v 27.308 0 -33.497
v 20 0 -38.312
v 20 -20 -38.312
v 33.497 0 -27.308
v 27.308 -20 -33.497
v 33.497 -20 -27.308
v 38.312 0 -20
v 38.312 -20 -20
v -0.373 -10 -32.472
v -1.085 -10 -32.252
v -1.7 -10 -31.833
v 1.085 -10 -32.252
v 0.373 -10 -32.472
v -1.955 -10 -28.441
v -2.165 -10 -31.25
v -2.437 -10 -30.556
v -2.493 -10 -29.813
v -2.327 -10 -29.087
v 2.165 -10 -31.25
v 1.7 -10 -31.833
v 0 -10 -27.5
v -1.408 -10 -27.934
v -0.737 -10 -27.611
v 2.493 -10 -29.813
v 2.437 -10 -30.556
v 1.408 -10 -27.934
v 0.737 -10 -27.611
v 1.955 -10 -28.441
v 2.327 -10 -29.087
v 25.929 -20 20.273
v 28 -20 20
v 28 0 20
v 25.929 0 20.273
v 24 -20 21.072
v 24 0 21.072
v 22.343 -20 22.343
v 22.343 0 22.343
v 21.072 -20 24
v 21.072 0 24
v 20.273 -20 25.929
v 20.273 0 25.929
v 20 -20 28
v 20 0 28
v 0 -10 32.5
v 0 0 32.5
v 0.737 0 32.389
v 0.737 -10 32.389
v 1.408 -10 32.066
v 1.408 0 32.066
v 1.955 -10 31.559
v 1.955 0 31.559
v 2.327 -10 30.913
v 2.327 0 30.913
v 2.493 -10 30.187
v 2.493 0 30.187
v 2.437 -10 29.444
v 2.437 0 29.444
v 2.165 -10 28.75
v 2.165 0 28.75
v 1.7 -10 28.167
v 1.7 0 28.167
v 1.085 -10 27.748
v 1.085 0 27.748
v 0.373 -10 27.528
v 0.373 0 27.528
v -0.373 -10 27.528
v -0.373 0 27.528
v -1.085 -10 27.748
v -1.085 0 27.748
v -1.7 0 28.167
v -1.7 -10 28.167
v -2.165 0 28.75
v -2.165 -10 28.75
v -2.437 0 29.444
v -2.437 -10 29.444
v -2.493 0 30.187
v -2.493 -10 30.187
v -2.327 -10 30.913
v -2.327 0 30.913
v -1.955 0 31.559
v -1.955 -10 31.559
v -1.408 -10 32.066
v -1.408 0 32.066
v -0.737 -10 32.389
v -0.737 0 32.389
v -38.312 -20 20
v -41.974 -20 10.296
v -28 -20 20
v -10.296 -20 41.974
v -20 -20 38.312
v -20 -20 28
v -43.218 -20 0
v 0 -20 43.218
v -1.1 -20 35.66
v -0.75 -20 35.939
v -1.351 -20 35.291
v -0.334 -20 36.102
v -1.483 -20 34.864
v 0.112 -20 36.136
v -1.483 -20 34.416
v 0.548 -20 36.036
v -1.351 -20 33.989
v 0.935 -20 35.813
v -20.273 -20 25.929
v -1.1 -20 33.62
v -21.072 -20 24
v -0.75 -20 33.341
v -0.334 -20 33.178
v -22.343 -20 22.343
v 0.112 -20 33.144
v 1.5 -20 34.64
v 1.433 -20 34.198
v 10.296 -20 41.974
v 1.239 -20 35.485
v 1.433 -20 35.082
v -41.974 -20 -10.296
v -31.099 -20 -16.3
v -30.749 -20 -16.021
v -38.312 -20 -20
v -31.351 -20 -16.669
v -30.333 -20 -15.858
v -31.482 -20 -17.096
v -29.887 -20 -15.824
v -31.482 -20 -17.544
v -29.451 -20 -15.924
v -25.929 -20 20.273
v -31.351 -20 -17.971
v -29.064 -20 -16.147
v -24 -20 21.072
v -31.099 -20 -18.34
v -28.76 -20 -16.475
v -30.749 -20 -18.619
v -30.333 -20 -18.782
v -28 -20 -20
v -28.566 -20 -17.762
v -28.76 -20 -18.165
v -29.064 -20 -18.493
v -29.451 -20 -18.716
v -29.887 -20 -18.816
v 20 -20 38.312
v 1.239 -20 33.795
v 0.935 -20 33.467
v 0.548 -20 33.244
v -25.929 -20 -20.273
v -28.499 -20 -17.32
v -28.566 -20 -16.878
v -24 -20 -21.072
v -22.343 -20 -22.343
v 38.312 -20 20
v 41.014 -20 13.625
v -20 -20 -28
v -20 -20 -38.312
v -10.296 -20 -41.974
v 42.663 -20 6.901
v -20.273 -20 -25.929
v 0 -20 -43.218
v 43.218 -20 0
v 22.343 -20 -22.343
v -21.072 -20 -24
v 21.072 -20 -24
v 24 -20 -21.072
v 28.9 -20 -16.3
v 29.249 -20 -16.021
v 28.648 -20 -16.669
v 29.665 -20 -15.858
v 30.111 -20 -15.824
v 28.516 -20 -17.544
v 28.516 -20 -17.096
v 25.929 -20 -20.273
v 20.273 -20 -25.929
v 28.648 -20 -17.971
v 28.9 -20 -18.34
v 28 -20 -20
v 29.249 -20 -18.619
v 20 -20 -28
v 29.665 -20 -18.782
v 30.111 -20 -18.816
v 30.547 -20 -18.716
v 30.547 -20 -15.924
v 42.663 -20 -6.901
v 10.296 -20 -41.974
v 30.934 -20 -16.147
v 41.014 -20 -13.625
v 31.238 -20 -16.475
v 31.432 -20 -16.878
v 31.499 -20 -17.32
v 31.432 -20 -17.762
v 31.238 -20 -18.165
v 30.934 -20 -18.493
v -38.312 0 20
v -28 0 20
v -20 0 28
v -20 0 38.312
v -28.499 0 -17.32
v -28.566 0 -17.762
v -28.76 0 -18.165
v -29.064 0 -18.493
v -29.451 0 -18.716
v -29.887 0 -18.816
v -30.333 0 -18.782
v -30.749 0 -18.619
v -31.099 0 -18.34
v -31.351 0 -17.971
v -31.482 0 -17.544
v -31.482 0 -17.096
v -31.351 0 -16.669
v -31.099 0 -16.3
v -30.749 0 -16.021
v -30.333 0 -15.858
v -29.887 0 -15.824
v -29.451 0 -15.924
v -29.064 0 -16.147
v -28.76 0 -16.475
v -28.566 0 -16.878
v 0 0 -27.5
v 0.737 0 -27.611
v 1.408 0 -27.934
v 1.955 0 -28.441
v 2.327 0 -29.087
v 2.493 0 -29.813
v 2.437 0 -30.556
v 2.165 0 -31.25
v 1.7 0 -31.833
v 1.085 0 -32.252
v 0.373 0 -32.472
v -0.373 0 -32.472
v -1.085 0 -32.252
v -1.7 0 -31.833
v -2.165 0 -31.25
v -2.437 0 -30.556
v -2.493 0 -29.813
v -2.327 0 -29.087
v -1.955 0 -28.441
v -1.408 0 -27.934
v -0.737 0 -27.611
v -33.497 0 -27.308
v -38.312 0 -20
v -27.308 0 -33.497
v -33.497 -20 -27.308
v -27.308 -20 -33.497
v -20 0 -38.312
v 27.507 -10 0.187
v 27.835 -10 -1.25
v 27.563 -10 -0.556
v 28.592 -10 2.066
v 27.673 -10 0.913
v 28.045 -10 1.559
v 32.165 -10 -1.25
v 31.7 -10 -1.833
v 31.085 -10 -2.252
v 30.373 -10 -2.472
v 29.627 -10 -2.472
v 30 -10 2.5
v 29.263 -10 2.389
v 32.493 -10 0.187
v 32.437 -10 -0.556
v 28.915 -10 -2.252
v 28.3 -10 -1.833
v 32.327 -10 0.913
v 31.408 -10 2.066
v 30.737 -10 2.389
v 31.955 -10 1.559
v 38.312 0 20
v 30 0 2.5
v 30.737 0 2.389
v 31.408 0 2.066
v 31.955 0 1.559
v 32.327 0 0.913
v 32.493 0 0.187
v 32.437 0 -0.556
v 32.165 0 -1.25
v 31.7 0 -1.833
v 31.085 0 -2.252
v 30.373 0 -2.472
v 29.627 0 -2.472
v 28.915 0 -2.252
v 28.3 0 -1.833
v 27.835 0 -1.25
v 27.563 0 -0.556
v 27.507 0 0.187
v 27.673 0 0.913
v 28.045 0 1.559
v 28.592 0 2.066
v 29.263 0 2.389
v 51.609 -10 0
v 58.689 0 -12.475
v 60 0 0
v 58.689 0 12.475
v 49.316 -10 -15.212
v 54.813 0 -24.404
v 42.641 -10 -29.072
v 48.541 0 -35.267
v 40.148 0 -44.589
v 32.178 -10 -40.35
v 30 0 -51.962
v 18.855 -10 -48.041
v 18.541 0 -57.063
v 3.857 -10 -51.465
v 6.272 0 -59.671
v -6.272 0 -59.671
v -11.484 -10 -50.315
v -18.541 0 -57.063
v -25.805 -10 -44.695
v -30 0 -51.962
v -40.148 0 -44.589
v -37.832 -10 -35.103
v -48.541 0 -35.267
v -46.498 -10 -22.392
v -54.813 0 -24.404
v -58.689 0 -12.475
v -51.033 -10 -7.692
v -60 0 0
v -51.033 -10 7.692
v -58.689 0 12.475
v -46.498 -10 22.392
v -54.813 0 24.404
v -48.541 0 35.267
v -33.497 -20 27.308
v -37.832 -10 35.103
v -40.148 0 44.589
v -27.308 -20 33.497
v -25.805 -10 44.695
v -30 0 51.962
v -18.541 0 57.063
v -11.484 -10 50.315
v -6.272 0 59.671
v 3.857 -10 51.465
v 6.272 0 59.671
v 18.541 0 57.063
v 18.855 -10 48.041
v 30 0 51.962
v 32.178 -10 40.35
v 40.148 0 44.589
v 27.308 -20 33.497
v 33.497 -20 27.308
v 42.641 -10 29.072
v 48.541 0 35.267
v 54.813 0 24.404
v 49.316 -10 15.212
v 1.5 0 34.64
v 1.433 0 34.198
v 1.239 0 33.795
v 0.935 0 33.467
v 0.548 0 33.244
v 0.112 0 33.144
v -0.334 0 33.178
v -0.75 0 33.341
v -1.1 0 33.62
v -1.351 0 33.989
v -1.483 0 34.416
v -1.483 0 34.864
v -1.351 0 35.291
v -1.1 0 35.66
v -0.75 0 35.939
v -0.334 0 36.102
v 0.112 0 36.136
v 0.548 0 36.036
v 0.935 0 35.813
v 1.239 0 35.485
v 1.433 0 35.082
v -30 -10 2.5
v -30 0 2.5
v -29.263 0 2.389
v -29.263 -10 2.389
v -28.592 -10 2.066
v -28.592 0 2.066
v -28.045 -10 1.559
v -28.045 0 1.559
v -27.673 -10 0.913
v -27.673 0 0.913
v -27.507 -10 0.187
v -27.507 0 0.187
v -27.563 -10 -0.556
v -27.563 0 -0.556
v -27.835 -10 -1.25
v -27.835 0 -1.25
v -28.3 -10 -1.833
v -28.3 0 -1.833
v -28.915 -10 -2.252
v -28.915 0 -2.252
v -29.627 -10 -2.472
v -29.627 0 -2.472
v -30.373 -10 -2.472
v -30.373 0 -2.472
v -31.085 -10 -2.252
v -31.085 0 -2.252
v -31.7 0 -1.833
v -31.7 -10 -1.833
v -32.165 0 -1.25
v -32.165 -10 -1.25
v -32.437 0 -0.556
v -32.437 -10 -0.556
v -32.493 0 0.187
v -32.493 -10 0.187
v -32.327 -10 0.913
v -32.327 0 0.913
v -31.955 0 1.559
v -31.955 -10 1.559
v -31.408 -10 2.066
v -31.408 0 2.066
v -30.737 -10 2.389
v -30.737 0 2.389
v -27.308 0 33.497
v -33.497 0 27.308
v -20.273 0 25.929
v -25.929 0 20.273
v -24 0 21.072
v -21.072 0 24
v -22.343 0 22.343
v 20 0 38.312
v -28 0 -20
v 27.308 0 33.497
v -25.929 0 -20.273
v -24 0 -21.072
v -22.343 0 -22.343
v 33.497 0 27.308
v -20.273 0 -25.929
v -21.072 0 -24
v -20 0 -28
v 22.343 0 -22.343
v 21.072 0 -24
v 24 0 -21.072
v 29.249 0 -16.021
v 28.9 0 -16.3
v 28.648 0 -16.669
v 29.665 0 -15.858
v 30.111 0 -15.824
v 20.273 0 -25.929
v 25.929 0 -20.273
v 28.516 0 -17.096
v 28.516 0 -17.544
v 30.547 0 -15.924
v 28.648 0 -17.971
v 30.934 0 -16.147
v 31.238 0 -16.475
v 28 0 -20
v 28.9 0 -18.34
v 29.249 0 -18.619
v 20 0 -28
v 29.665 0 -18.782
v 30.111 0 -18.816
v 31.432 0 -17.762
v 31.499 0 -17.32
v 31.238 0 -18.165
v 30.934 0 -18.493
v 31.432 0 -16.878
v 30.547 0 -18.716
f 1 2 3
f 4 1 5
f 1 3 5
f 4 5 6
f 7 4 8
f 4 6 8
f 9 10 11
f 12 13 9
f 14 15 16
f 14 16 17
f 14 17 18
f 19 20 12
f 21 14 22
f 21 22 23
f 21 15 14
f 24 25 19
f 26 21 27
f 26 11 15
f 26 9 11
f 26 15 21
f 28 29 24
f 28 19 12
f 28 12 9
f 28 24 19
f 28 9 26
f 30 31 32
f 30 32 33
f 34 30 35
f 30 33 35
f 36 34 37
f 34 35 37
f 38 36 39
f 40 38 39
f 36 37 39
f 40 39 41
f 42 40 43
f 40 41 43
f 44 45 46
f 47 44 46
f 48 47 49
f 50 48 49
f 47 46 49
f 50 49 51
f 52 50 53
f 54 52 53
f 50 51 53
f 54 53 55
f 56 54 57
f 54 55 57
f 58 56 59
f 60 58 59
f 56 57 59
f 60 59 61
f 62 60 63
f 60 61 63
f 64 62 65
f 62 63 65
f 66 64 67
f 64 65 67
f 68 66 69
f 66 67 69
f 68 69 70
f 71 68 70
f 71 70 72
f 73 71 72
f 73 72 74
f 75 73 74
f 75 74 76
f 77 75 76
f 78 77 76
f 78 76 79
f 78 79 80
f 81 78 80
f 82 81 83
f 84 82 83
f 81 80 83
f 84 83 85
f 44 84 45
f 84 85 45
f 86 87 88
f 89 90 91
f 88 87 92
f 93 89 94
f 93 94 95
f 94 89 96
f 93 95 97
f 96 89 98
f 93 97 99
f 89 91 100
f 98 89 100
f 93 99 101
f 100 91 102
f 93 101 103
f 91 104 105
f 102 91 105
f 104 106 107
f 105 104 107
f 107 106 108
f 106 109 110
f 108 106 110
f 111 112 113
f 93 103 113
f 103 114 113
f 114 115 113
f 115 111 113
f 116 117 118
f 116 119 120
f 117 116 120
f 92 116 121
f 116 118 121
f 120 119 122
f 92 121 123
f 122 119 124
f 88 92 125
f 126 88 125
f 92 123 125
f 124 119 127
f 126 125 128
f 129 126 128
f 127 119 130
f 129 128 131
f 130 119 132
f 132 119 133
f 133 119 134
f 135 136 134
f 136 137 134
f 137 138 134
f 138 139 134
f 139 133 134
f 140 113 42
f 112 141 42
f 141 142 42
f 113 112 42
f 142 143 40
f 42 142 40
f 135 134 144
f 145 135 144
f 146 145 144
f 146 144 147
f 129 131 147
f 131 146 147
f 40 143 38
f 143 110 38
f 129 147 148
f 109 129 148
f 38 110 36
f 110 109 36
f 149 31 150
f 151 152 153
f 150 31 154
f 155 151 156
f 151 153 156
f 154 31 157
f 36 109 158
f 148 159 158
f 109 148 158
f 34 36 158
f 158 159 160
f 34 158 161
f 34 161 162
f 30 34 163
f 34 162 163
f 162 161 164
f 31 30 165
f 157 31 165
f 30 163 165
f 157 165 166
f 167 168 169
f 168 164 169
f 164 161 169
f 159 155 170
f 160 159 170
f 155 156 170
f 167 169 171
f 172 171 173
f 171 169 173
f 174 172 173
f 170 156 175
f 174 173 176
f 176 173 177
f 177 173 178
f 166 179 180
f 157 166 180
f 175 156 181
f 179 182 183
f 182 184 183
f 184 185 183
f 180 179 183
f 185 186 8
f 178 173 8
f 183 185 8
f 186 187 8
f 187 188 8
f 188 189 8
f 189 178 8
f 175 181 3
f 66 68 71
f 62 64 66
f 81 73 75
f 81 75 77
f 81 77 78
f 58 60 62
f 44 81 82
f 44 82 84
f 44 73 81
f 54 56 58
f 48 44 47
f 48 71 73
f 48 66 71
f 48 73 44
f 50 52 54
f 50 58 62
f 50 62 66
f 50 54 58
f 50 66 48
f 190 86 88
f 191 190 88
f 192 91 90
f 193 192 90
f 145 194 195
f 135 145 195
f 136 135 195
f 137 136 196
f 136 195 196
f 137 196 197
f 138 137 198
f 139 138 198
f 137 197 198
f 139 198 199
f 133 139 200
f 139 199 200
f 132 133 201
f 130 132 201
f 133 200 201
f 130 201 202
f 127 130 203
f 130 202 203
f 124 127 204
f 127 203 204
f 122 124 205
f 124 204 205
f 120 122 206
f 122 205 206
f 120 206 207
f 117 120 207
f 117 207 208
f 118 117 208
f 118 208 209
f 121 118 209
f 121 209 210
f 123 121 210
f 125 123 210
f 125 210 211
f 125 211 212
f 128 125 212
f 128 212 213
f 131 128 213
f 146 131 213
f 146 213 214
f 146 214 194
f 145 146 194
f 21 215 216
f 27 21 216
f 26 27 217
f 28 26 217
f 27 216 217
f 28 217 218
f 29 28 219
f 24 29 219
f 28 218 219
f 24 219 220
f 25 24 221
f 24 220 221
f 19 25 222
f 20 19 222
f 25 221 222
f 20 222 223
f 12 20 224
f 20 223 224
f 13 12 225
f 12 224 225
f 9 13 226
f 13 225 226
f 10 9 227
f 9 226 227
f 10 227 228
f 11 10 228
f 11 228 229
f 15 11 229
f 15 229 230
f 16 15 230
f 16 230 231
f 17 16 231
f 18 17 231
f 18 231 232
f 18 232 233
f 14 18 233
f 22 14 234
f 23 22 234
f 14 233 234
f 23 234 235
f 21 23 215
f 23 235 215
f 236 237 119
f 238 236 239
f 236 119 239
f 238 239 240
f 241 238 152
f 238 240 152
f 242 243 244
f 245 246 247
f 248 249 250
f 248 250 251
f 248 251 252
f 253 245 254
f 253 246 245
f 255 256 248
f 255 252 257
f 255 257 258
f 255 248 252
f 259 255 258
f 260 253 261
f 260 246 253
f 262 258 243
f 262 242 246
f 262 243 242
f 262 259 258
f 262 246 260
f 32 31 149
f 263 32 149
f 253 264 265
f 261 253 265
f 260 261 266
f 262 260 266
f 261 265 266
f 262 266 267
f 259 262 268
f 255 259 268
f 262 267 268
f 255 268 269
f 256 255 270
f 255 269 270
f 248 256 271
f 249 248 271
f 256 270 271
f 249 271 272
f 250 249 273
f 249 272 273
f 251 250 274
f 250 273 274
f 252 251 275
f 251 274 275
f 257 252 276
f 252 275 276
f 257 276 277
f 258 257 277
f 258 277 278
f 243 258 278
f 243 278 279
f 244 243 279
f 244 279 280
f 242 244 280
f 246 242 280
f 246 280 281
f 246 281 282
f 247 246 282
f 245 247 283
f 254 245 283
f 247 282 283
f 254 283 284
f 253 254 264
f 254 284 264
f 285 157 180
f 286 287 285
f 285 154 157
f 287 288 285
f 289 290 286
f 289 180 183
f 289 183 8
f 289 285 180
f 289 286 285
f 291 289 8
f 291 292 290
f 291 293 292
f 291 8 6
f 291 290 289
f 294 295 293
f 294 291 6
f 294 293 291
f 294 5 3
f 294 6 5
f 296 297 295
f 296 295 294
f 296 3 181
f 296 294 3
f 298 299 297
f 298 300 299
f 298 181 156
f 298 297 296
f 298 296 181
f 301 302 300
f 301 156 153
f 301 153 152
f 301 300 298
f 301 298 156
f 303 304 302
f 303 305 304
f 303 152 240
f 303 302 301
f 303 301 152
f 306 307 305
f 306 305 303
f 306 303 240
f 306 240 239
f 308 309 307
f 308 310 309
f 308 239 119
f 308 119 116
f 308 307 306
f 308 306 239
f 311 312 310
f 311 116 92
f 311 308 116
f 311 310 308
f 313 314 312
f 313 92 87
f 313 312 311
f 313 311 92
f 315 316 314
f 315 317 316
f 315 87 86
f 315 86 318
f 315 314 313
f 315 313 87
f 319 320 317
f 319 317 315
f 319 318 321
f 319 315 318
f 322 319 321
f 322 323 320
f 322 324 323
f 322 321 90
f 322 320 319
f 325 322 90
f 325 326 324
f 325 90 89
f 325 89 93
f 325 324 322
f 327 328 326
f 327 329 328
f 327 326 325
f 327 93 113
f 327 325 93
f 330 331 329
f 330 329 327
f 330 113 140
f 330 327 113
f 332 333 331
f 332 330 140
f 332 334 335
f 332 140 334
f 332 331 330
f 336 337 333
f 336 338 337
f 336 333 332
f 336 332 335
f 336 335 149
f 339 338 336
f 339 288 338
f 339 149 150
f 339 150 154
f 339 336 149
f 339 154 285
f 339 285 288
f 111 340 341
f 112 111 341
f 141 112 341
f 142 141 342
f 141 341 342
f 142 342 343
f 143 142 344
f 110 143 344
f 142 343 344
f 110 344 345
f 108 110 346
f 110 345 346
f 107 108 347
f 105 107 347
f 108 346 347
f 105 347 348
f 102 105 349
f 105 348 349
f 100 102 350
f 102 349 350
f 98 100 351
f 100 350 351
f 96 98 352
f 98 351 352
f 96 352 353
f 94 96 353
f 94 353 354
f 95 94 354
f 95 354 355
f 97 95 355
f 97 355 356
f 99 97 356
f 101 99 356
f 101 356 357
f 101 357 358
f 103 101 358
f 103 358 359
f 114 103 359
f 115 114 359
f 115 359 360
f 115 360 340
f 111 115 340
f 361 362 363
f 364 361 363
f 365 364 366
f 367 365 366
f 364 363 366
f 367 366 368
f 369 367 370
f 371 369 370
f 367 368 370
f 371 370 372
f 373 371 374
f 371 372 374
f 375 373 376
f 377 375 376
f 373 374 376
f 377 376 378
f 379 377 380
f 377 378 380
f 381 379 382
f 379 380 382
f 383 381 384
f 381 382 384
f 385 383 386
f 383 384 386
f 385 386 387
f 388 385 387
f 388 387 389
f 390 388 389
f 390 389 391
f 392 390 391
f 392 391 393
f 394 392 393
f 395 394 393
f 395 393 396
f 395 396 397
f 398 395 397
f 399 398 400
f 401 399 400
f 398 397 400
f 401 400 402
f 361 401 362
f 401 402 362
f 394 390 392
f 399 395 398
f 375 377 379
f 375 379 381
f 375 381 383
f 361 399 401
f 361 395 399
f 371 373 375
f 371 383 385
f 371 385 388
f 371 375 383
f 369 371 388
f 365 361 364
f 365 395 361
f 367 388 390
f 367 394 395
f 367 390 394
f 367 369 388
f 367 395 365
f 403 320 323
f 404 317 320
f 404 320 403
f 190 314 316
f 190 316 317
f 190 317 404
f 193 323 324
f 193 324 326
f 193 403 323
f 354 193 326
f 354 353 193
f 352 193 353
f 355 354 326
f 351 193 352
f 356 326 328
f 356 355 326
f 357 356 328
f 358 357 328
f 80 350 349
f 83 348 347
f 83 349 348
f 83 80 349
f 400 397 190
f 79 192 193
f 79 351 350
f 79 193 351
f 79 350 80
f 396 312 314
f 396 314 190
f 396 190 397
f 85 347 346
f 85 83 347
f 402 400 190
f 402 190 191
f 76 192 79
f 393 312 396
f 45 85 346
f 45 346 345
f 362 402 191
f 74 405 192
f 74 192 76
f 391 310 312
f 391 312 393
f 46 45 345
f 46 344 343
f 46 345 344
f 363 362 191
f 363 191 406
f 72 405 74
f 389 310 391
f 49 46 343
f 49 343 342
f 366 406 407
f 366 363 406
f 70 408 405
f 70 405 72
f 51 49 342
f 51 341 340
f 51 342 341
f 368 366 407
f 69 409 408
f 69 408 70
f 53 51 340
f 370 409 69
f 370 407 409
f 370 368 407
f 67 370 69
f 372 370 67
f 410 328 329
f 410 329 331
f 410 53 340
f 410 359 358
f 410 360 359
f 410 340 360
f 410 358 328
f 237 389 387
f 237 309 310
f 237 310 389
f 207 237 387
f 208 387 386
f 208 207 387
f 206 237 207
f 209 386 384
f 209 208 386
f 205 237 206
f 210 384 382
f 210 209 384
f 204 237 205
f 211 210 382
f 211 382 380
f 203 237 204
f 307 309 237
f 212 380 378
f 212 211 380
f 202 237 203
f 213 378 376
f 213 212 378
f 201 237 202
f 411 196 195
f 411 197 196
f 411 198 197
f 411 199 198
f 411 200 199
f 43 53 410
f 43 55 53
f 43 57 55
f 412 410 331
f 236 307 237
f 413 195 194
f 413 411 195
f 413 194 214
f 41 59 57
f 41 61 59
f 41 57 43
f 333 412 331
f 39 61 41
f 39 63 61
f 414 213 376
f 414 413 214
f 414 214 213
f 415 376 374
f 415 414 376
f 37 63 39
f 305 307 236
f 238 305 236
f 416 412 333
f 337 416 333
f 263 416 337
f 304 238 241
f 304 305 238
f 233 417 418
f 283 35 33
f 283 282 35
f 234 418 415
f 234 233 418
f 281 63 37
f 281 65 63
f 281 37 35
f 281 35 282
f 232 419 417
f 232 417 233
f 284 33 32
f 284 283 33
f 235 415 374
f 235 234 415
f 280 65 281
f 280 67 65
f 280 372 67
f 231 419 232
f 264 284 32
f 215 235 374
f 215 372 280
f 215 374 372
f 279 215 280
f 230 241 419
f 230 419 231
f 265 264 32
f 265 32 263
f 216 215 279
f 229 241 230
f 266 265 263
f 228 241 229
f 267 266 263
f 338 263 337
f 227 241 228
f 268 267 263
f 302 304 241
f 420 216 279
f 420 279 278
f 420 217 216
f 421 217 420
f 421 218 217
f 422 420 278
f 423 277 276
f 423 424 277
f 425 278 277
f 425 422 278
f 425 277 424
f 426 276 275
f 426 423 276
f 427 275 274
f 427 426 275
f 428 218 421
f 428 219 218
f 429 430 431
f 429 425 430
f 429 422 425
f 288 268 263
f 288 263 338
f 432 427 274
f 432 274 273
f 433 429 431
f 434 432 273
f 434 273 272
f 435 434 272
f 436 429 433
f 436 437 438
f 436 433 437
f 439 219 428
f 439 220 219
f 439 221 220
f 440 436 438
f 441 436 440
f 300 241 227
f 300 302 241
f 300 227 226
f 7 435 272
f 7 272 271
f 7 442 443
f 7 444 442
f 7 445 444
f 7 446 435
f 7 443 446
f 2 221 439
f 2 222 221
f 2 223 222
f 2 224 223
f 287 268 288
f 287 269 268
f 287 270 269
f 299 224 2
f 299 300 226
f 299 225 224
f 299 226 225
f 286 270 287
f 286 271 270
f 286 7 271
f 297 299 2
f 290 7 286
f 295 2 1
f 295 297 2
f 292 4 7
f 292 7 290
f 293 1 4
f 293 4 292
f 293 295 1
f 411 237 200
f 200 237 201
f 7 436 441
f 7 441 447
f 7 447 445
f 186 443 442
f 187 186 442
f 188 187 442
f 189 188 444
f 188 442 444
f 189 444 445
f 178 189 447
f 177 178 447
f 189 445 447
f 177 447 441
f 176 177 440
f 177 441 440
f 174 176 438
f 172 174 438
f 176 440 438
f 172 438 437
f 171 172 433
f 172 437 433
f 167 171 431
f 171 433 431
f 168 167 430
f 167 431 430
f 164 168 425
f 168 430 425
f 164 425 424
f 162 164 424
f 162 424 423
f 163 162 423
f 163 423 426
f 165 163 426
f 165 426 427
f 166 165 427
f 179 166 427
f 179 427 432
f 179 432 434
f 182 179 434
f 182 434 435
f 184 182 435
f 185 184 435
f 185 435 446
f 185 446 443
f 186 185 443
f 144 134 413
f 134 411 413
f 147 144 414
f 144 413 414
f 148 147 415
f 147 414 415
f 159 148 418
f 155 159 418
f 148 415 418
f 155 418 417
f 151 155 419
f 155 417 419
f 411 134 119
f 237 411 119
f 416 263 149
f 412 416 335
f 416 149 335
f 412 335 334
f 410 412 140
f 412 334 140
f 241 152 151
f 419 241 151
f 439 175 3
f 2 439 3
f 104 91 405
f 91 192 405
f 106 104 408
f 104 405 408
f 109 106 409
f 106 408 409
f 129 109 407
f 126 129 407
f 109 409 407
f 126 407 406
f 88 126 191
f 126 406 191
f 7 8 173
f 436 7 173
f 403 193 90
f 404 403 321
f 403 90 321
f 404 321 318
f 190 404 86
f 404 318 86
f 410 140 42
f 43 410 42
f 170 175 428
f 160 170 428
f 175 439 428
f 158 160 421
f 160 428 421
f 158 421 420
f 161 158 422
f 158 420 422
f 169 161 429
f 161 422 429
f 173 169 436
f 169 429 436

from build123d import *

# Parameters (mm, degrees)
SKETCH1_R             = 60
BOSS_EXTRUDE1_DEPTH   = 20
BOSS_EXTRUDE1_DRAFT   = -40
CUT_EXTRUDE1_DEPTH    = 25
F_3_0MM_DOWEL_HOLE1_D = 3
FILLET1_R             = 8
SKETCH13_R            = 2.5
CUT_EXTRUDE5_DEPTH    = 10


with BuildPart() as part:
    # Sketch1 → Boss-Extrude1 (with draft: the straight prism first)
    with BuildSketch(Plane(origin=(0, 0, 0), x_dir=(1, 0, 0), z_dir=(0, 1, 0))):
        Circle(SKETCH1_R)
    extrude(amount=-BOSS_EXTRUDE1_DEPTH)
    # Boss-Extrude1: the draft: its side faces are tilted about the plane it starts from
    boss_extrude1_sides = [part.faces().sort_by_distance(p)[0] for p in [
        (-60, -10, 0),
    ]]
    draft(boss_extrude1_sides, Plane(origin=(0, 0, 0), x_dir=(1, 0, 0), z_dir=(0, 1, 0)), BOSS_EXTRUDE1_DRAFT)

    # Sketch5 → Cut-Extrude1 (cut)
    with BuildSketch(Plane.XZ.offset(20)):
        with BuildLine():
            Line((-20, 20), (-20, 38.311827959))
            ThreePointArc((-20, 38.311827959), (-30.559746085, 30.559746085), (-38.311827959, 20))
            Line((-38.311827959, 20), (-20, 20))
        make_face()
        with BuildLine():
            ThreePointArc((38.311827959, 20), (30.559746085, 30.559746085), (20, 38.311827959))
            Line((20, 38.311827959), (20, 20))
            Line((20, 20), (38.311827959, 20))
        make_face()
        with BuildLine():
            Line((-20, -20), (-38.311827959, -20))
            ThreePointArc((-38.311827959, -20), (-30.559746085, -30.559746085), (-20, -38.311827959))
            Line((-20, -38.311827959), (-20, -20))
        make_face()
        with BuildLine():
            ThreePointArc((20, -38.311827959), (30.559746085, -30.559746085), (38.311827959, -20))
            Line((38.311827959, -20), (20, -20))
            Line((20, -20), (20, -38.311827959))
        make_face()
    extrude(amount=-CUT_EXTRUDE1_DEPTH, mode=Mode.SUBTRACT)

    # Ø3.0mm Dowel Hole1 (through all)
    with Locations(Plane(origin=(0, -20, 0), x_dir=(-1, 0, 0), z_dir=(0, -1, 0))):
        with Locations((0, -34.64), (-29.999119987, 17.32), (29.999119987, 17.32)):
            Hole(F_3_0MM_DOWEL_HOLE1_D / 2)

    # Fillet1
    fillet1_edges = [part.edges().sort_by_distance(p)[0] for p in [
        (-20, -10, -20),
        (20, -10, -20),
        (20, -10, 20),
        (-20, -10, 20),
    ]]
    fillet(fillet1_edges, radius=FILLET1_R)

    # Sketch13 → Cut-Extrude5 (cut)
    with BuildSketch(Plane(origin=(0, 0, 0), x_dir=(1, 0, 0), z_dir=(0, 1, 0))):
        with Locations(Location((0, 30, 0), (0, 0, 270))):
            Circle(SKETCH13_R)
        with Locations(Location((30, 0, 0), (0, 0, 270))):
            Circle(SKETCH13_R)
        with Locations(Location((0, -30, 0), (0, 0, 270))):
            Circle(SKETCH13_R)
        with Locations(Location((-30, 0, 0), (0, 0, 270))):
            Circle(SKETCH13_R)
    extrude(amount=-CUT_EXTRUDE5_DEPTH, mode=Mode.SUBTRACT)


solid = part.part
